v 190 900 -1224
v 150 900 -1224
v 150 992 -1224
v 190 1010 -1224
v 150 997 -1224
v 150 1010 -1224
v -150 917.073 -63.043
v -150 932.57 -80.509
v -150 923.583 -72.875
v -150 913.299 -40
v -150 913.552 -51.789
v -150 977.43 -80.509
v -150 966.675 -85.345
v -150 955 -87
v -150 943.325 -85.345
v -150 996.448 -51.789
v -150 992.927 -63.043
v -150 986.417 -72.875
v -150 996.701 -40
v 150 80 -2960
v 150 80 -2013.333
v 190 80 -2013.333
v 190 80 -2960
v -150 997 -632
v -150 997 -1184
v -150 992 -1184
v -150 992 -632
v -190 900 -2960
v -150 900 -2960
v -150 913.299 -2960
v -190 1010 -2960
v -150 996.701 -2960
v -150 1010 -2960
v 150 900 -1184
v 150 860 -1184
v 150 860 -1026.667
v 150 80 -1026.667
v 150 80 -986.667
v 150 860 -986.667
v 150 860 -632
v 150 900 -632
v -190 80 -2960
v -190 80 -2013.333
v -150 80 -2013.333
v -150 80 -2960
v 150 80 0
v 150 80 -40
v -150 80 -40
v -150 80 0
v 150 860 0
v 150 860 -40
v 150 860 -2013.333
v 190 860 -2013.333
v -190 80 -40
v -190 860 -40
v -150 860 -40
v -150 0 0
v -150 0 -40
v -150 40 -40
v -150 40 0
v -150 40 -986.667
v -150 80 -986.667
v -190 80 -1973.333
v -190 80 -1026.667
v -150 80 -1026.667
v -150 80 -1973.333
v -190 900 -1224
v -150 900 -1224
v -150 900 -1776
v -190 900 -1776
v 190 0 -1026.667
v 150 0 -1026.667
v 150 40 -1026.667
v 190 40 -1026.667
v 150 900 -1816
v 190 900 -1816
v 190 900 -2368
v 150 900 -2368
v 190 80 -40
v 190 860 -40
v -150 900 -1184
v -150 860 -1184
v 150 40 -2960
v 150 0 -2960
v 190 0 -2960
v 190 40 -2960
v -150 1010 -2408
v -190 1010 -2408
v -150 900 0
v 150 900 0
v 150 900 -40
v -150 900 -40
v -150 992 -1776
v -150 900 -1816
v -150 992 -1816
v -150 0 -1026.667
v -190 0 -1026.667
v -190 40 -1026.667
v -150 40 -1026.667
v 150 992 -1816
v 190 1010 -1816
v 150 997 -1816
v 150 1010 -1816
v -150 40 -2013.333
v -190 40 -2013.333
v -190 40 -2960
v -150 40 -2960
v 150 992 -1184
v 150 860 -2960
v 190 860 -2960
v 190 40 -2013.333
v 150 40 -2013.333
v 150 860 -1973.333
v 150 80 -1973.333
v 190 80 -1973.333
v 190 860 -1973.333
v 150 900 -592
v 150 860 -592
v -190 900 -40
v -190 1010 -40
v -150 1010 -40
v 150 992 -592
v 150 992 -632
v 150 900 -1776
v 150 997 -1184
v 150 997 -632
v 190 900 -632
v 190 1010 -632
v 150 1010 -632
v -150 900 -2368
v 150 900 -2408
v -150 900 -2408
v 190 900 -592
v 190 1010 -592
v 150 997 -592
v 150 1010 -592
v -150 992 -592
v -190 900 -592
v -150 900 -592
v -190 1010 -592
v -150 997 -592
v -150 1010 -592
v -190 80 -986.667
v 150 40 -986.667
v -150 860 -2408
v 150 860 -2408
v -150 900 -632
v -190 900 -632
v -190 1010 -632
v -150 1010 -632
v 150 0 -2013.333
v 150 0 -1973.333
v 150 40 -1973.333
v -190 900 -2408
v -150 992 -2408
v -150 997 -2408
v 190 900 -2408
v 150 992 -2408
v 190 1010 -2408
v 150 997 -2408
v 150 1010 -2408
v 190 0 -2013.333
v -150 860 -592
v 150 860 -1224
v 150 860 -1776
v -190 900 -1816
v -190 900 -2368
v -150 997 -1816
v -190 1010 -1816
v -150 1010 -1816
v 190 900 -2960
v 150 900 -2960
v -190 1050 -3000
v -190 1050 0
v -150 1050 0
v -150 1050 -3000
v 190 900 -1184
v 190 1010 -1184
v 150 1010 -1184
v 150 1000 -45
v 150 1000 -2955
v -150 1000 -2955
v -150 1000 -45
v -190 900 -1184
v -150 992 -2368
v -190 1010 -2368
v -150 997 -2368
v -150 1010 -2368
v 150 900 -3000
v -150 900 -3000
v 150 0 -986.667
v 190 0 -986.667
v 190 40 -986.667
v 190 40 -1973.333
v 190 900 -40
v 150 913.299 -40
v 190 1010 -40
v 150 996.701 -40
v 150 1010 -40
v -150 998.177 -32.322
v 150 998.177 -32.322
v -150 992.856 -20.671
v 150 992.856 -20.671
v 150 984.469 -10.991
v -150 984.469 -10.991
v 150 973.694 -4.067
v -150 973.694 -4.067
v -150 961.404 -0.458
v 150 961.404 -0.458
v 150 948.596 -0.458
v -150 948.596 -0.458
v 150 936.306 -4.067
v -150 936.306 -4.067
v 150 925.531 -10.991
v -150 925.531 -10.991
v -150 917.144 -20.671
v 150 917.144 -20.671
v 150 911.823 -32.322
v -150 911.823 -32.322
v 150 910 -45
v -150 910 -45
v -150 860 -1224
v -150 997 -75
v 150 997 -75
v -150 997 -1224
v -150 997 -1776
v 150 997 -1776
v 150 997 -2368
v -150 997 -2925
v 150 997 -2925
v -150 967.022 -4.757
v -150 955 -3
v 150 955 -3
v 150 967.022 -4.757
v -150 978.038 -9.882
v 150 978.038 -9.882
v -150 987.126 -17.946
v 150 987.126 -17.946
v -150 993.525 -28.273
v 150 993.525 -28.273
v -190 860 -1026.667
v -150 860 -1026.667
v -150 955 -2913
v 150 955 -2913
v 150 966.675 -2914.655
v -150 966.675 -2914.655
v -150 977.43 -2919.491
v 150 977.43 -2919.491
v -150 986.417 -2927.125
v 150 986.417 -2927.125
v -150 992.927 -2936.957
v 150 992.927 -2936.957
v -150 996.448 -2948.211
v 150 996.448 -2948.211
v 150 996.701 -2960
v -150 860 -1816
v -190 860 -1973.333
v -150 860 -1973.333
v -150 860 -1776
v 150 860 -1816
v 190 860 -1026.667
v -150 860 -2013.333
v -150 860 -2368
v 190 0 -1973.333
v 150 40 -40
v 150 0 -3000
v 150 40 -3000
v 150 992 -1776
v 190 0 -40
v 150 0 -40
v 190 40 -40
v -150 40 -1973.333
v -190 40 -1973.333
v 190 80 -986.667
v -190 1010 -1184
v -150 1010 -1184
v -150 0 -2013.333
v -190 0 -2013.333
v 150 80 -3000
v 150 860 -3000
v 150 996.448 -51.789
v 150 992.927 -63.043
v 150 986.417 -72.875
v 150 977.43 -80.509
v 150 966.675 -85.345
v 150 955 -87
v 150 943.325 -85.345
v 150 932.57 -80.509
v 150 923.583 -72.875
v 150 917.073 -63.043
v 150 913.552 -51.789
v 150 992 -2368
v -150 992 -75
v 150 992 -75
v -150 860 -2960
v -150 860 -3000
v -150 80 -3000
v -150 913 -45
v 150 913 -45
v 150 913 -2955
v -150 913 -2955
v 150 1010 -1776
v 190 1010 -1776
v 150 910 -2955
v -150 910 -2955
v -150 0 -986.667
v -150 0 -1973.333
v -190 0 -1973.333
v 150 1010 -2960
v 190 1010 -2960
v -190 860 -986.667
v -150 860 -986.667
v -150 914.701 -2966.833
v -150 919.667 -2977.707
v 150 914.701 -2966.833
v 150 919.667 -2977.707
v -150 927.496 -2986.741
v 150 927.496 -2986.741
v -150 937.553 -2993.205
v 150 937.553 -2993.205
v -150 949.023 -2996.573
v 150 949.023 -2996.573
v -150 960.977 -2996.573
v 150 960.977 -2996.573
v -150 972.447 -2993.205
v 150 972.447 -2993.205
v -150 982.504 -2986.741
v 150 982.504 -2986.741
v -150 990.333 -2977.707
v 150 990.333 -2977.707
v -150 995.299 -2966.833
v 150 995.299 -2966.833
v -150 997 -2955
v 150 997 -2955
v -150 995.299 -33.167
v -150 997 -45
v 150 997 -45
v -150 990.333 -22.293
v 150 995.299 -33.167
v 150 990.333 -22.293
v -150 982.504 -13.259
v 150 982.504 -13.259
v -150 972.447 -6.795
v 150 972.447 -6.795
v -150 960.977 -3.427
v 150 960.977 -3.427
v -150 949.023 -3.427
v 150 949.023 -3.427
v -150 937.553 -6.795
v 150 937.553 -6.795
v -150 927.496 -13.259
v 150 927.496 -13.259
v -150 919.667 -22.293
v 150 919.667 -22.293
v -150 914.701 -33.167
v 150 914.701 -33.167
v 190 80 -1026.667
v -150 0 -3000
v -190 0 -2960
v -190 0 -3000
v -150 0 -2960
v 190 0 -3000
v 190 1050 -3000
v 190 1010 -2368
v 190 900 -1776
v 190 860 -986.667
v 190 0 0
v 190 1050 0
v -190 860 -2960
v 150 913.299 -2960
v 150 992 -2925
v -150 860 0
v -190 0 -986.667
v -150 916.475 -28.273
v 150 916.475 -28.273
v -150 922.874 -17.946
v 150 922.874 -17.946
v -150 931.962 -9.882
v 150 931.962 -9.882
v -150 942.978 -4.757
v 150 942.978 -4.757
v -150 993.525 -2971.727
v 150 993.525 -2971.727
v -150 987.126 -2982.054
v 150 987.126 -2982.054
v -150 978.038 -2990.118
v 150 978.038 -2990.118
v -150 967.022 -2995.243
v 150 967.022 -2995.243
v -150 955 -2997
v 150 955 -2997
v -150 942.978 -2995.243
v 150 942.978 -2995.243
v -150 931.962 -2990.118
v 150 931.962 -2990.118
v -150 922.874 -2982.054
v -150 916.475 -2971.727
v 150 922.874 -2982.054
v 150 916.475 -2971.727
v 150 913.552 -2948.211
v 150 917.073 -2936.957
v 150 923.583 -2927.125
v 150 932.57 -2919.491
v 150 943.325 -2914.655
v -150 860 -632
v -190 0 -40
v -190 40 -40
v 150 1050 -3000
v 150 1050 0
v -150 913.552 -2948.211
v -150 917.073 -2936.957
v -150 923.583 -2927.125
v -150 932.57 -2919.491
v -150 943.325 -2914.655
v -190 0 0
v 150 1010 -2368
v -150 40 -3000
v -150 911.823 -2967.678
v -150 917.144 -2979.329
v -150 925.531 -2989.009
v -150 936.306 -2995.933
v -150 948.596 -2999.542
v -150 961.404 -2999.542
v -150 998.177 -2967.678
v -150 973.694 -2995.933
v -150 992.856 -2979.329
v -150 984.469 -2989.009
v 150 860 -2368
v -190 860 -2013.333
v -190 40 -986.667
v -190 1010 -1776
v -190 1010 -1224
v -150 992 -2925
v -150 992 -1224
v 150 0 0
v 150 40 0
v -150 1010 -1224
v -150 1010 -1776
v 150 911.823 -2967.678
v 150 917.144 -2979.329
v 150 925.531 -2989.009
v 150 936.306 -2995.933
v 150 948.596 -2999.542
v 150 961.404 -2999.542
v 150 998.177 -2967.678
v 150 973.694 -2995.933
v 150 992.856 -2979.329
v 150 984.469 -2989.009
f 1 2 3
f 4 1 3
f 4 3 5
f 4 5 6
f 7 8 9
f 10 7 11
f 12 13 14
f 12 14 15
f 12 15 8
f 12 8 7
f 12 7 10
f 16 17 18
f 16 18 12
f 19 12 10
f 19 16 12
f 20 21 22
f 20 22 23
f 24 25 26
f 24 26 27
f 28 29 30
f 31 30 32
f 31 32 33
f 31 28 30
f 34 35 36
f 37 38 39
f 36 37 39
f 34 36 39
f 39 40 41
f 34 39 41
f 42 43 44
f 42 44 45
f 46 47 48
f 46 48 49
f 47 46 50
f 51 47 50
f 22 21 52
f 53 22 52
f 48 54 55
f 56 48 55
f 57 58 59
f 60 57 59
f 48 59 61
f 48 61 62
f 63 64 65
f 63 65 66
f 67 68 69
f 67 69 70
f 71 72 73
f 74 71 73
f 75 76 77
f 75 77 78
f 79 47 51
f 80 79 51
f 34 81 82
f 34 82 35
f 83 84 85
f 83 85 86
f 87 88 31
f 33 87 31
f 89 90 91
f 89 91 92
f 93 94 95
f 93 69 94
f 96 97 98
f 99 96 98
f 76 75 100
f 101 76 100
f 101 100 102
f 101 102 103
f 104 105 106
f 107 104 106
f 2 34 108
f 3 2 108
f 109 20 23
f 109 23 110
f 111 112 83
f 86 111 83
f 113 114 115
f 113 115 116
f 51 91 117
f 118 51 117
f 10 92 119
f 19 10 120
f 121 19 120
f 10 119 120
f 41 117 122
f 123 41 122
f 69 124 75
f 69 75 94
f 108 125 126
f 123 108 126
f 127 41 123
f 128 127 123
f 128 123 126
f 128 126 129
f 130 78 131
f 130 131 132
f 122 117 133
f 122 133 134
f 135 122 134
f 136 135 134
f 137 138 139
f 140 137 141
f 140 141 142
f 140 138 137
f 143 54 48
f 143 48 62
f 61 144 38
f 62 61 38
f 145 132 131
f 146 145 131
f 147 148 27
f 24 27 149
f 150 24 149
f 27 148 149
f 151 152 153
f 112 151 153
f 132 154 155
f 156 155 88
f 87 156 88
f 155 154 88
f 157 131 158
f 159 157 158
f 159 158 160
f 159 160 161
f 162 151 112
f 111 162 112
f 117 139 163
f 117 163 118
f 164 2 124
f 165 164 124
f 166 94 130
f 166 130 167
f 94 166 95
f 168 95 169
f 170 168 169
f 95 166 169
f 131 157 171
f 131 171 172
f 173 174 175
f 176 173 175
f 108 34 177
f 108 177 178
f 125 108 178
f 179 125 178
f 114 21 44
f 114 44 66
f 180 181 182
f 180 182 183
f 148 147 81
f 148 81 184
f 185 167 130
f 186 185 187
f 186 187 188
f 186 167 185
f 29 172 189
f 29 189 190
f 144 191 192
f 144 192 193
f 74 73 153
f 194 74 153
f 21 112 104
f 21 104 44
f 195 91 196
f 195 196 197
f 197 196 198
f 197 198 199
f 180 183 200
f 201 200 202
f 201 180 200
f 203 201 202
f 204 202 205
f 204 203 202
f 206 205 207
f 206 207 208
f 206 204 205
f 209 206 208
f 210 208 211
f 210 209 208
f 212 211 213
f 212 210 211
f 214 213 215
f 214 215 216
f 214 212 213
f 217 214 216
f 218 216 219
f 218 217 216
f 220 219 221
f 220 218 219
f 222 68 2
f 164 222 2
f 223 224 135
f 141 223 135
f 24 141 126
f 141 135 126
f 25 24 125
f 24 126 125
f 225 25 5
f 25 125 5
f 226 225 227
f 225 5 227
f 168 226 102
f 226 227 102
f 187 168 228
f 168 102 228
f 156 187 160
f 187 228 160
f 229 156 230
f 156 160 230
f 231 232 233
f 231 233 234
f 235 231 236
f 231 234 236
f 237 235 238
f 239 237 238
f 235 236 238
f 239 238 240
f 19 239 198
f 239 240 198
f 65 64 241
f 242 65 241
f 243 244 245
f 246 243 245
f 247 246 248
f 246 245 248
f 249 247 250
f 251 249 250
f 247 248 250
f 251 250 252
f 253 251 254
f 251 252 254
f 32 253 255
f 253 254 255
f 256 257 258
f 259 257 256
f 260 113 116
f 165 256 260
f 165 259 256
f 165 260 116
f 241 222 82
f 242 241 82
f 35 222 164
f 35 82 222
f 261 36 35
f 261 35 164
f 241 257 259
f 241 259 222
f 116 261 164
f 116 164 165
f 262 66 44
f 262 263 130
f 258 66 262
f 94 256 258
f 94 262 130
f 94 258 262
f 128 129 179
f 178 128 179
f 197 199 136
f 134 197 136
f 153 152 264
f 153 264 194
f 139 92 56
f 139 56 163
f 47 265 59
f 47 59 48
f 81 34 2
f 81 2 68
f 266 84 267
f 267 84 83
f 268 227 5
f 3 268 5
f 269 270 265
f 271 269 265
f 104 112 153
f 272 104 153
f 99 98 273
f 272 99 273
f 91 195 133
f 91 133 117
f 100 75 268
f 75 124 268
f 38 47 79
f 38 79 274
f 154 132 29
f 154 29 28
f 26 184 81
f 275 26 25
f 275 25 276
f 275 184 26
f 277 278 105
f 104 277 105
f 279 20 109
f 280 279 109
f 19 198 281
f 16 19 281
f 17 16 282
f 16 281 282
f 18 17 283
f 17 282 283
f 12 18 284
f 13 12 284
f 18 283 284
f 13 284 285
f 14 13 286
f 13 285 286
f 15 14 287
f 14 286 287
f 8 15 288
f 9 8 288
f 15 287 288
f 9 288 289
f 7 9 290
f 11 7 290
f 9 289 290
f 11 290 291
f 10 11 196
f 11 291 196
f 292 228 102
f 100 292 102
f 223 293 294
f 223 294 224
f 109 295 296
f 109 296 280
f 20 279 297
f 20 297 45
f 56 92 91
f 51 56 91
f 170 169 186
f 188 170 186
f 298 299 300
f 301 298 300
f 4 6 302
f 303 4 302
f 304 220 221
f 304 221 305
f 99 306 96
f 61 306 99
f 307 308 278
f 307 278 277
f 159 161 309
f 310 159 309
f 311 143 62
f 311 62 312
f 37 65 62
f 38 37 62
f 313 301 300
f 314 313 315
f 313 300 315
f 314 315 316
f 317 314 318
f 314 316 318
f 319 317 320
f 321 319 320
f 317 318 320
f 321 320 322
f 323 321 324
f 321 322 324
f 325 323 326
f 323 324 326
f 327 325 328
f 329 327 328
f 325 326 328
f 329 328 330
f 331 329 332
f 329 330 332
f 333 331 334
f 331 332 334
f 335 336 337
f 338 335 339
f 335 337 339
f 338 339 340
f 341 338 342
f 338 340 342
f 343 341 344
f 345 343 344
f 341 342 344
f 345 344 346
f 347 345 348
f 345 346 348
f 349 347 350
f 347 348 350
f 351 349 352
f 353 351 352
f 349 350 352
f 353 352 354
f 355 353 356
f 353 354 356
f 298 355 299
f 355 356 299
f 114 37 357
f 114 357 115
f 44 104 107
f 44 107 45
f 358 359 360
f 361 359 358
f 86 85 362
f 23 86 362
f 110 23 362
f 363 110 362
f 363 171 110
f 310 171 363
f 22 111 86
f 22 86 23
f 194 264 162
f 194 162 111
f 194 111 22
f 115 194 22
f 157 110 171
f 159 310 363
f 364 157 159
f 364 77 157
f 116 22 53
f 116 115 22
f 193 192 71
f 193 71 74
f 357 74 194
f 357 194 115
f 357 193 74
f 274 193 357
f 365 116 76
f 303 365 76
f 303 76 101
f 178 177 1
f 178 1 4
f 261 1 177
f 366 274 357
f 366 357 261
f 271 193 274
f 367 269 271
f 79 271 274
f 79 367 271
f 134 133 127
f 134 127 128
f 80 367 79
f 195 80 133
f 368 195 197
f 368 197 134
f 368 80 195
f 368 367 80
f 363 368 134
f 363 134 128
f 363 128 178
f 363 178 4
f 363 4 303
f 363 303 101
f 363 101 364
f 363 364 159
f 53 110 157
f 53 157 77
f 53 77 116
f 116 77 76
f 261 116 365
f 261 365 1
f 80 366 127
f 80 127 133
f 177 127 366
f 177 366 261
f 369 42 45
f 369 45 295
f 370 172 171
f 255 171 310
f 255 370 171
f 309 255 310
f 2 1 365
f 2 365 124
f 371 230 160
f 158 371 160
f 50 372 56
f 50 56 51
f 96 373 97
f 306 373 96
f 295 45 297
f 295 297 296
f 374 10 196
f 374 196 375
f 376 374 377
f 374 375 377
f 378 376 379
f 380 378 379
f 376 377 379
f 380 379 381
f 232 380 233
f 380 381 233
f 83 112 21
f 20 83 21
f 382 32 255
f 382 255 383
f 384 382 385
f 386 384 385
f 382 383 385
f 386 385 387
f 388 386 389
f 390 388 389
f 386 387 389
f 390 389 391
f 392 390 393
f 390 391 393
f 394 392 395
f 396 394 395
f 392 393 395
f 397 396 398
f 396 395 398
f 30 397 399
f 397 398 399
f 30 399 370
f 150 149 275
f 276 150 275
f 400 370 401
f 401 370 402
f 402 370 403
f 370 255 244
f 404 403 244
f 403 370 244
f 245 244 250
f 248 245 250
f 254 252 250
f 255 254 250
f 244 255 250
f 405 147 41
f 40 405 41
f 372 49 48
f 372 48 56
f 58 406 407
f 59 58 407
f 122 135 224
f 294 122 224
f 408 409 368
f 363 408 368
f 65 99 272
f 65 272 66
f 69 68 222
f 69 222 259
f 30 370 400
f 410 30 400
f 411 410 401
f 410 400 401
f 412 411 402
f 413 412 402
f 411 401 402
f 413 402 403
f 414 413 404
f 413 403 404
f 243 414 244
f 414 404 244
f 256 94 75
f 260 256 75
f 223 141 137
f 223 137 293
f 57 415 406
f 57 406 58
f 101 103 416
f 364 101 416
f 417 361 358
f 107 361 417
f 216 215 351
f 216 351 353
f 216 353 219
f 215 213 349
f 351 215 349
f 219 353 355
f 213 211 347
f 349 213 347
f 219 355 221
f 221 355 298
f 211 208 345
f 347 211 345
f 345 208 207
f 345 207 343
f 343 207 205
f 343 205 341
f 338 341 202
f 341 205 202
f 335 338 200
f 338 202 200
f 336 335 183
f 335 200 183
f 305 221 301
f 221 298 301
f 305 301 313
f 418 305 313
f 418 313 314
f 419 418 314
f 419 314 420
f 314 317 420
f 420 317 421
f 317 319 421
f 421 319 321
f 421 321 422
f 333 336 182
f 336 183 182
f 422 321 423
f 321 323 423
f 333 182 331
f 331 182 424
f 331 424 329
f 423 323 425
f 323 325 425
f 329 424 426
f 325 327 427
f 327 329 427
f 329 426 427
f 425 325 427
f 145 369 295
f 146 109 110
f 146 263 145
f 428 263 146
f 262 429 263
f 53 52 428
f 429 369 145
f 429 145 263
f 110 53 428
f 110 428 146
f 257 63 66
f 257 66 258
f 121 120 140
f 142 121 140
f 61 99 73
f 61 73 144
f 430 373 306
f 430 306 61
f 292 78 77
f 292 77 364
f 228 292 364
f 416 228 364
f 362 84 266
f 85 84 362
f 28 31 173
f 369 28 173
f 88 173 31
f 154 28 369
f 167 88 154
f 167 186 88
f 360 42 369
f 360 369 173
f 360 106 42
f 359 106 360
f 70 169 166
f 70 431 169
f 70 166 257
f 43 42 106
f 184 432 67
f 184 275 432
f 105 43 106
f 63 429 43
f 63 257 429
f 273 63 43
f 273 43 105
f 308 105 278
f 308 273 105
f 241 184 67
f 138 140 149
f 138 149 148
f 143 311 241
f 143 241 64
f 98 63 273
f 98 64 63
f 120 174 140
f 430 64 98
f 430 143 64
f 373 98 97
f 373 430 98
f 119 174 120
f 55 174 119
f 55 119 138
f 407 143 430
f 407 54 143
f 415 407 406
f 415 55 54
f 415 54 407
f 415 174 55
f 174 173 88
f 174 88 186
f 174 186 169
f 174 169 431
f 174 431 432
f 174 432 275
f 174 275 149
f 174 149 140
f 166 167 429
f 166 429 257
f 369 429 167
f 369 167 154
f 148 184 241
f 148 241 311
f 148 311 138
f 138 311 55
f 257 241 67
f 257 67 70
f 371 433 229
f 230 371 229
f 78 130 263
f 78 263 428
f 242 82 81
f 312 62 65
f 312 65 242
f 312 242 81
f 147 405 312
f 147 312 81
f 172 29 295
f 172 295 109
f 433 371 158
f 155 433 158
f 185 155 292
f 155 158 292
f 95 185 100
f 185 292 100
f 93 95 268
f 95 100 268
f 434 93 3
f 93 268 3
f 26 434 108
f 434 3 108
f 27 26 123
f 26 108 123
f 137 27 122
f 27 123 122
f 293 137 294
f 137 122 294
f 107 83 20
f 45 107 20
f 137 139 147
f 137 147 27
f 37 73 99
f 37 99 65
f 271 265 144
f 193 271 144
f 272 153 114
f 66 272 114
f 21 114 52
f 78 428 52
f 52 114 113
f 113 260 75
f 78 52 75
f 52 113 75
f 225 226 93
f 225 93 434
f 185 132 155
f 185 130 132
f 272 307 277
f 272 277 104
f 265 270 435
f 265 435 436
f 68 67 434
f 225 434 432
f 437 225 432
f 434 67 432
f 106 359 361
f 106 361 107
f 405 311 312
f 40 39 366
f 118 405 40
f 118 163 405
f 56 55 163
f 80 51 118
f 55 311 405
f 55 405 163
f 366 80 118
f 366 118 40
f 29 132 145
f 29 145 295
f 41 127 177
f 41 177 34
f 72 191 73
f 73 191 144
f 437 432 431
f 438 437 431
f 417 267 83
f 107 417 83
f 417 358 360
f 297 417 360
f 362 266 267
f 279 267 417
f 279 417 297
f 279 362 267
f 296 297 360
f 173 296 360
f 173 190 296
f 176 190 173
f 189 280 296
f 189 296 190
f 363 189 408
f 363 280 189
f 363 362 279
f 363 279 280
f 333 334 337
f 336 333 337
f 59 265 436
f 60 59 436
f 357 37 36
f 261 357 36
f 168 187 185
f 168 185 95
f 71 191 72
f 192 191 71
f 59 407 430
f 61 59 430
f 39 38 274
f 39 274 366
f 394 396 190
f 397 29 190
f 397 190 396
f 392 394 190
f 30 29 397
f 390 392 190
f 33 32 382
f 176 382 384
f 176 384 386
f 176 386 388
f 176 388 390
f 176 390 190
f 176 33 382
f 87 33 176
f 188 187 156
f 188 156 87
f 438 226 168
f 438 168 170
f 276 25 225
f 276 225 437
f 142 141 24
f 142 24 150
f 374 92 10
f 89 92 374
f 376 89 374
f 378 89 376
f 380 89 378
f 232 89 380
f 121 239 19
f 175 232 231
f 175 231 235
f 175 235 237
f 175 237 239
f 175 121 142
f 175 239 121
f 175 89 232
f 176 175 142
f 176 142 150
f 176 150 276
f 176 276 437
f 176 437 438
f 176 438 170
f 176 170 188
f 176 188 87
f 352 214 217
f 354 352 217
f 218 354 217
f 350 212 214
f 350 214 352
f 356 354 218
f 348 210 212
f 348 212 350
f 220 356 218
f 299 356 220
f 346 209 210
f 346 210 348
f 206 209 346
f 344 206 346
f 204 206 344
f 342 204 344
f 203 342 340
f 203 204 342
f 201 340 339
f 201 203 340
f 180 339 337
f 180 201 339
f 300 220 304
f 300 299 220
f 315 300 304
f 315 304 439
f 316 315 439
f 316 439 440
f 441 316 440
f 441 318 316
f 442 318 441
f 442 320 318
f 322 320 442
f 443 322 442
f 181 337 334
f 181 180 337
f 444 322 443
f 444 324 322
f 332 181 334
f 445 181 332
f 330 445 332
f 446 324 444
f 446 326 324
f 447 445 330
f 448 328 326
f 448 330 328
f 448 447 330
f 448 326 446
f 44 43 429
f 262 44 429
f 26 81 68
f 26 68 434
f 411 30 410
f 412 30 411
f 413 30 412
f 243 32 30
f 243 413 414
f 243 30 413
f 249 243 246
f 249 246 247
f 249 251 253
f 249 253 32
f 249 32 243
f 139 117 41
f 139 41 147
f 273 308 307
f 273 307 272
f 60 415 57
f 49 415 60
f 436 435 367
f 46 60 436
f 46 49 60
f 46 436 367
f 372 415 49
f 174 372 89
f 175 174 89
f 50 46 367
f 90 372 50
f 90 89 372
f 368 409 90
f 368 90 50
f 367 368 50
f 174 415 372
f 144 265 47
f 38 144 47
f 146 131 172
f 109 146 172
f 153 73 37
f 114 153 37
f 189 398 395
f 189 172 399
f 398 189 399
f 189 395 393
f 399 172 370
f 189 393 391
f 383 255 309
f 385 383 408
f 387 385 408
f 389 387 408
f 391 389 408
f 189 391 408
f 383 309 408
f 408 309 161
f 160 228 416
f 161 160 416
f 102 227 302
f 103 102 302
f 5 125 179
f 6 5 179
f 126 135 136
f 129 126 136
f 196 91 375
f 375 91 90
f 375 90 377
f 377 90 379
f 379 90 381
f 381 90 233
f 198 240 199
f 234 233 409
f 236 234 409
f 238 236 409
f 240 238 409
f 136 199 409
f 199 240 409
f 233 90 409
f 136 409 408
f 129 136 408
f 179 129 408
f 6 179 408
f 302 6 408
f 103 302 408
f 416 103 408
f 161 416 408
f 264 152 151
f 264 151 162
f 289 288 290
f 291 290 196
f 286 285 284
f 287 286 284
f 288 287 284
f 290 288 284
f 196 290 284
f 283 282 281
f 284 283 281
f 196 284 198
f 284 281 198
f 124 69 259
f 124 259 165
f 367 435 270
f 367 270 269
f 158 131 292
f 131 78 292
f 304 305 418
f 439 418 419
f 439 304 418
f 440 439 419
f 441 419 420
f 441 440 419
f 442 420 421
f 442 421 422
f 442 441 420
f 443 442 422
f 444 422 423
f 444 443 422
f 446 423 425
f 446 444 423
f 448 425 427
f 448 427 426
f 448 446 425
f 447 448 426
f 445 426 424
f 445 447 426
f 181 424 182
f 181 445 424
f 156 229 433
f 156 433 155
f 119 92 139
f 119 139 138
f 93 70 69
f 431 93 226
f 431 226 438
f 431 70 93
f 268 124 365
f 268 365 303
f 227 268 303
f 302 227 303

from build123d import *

# Parameters (mm, degrees)
SKIZZE1_W                            = 40
SKIZZE1_H                            = 860
SKIZZE1_H_2                          = 150
AUFSATZ_LINEAR_AUSTRAGEN1_DEPTH      = 3000
SCHNITT_LINEAR_AUSTRAGEN1_DEPTH      = 3202.077943443
SCHNITT_LINEAR_AUSTRAGEN1_DEPTH_BACK = 3202.077943443
SKIZZE2_W                            = 552
SKIZZE2_H                            = 110
SKIZZE2_W_2                          = 946.666666667
SKIZZE2_H_2                          = 780
SKIZZE2_W_3                          = 946.666666666
SKIZZE2_H_3                          = 40
SKIZZE3_W                            = 300
SKIZZE3_H                            = 552
SCHNITT_LINEAR_AUSTRAGEN2_DEPTH      = 3138.849582118
AUFSATZ_LINEAR_AUSTRAGEN2_DEPTH      = 300
SKIZZE5_W                            = 517
SKIZZE5_H                            = 5
SKIZZE5_W_2                          = 552
SKIZZE5_W_3                          = 40
AUFSATZ_LINEAR_AUSTRAGEN3_DEPTH      = 300
SKIZZE6_W                            = 40
SKIZZE6_H                            = 40
AUFSATZ_LINEAR_AUSTRAGEN4_DEPTH      = 300


with BuildPart() as part:
    # Skizze1 → Aufsatz-Linear austragen1 (new body)
    with BuildSketch(Plane.XY):
        with Locations((170, 430)):
            Rectangle(SKIZZE1_W, SKIZZE1_H)
        Polygon((-150, 900), (-190, 900), (-190, 860), (-150, 860), (150, 860), (190, 860), (190, 900), (150, 900), align=None)
        with Locations((170, 975)):
            Rectangle(SKIZZE1_W, SKIZZE1_H_2)
        with Locations((-170, 975)):
            Rectangle(SKIZZE1_W, SKIZZE1_H_2)
        with Locations((-170, 430)):
            Rectangle(SKIZZE1_W, SKIZZE1_H)
    extrude(amount=-AUFSATZ_LINEAR_AUSTRAGEN1_DEPTH)

    # Skizze2 → Schnitt-Linear austragen1 (cut, two sides: drawn at the far end of the back side and taken through both)
    with BuildSketch(Plane(origin=(190, 0, 0), x_dir=(0, 0, -1), z_dir=(1, 0, 0)).offset(-SCHNITT_LINEAR_AUSTRAGEN1_DEPTH_BACK)):
        with Locations((316, 955)):
            Rectangle(SKIZZE2_W, SKIZZE2_H)
        with Locations((908, 955)):
            Rectangle(SKIZZE2_W, SKIZZE2_H)
        with Locations((513.333333334, 470)):
            Rectangle(SKIZZE2_W_2, SKIZZE2_H_2)
        with Locations((1500, 470)):
            Rectangle(SKIZZE2_W_3, SKIZZE2_H_2)
        with Locations((2486.666666667, 470)):
            Rectangle(SKIZZE2_W_2, SKIZZE2_H_2)
        with Locations((513.333333334, 20)):
            Rectangle(SKIZZE2_W_2, SKIZZE2_H_3)
        with Locations((1500, 20)):
            Rectangle(SKIZZE2_W_3, SKIZZE2_H_3)
        with Locations((2486.666666667, 20)):
            Rectangle(SKIZZE2_W_2, SKIZZE2_H_3)
        with Locations((1500, 955)):
            Rectangle(SKIZZE2_W, SKIZZE2_H)
        with Locations((2092, 955)):
            Rectangle(SKIZZE2_W, SKIZZE2_H)
        with Locations((2684, 955)):
            Rectangle(SKIZZE2_W, SKIZZE2_H)
    extrude(amount=SCHNITT_LINEAR_AUSTRAGEN1_DEPTH + SCHNITT_LINEAR_AUSTRAGEN1_DEPTH_BACK, mode=Mode.SUBTRACT)

    # Skizze3 → Schnitt-Linear austragen2 (cut, through all)
    with BuildSketch(Plane(origin=(0, 900, 0), x_dir=(1, 0, 0), z_dir=(0, 1, 0))):
        with Locations((0, 2684)):
            Rectangle(SKIZZE3_W, SKIZZE3_H)
        with Locations((0, 2092)):
            Rectangle(SKIZZE3_W, SKIZZE3_H)
        with Locations((0, 1500)):
            Rectangle(SKIZZE3_W, SKIZZE3_H)
        with Locations((0, 908)):
            Rectangle(SKIZZE3_W, SKIZZE3_H)
        with Locations((0, 316)):
            Rectangle(SKIZZE3_W, SKIZZE3_H)
    extrude(amount=-SCHNITT_LINEAR_AUSTRAGEN2_DEPTH, mode=Mode.SUBTRACT)

    # Skizze5 → Aufsatz-Linear austragen3 (add)
    with BuildSketch(Plane.ZY.offset(-150)):
        with Locations((-2666.5, 994.5)):
            Rectangle(SKIZZE5_W, SKIZZE5_H)
        with BuildLine():
            ThreePointArc((-2960, 913.298681076), (-2927.12528027, 923.583443855), (-2913, 955))
            ThreePointArc((-2913, 955), (-2927.12528027, 986.416556145), (-2960, 996.701318924))
            Line((-2960, 996.701318924), (-2960, 913.298681076))
        make_face()
        with BuildLine():
            Line((-2960, 913.298681076), (-2960, 996.701318924))
            ThreePointArc((-2960, 996.701318924), (-2997, 955), (-2960, 913.298681076))
        make_face()
        with Locations((-2092, 994.5)):
            Rectangle(SKIZZE5_W_2, SKIZZE5_H)
        with Locations((-2388, 994.5)):
            Rectangle(SKIZZE5_W_3, SKIZZE5_H)
        with Locations((-1500, 994.5)):
            Rectangle(SKIZZE5_W_2, SKIZZE5_H)
        with Locations((-1796, 994.5)):
            Rectangle(SKIZZE5_W_3, SKIZZE5_H)
        with Locations((-908, 994.5)):
            Rectangle(SKIZZE5_W_2, SKIZZE5_H)
        with Locations((-1204, 994.5)):
            Rectangle(SKIZZE5_W_3, SKIZZE5_H)
        with Locations((-612, 994.5)):
            Rectangle(SKIZZE5_W_3, SKIZZE5_H)
        with BuildLine():
            ThreePointArc((-40, 913.298681076), (-13.583443855, 927.12528027), (-3, 955))
            ThreePointArc((-3, 955), (-13.583443855, 982.87471973), (-40, 996.701318924))
            Line((-40, 996.701318924), (-40, 913.298681076))
        make_face()
        with BuildLine():
            Line((-40, 913.298681076), (-40, 996.701318924))
            ThreePointArc((-40, 996.701318924), (-87, 955), (-40, 913.298681076))
        make_face()
        with Locations((-333.5, 994.5)):
            Rectangle(SKIZZE5_W, SKIZZE5_H)
    extrude(amount=AUFSATZ_LINEAR_AUSTRAGEN3_DEPTH)

    # Skizze6 → Aufsatz-Linear austragen4 (add)
    with BuildSketch(Plane.ZY.offset(-150)):
        with Locations((-2980, 60)):
            Rectangle(SKIZZE6_W, SKIZZE6_H)
        with Locations((-1993.333333333, 60)):
            Rectangle(SKIZZE6_W, SKIZZE6_H)
        with Locations((-20, 60)):
            Rectangle(SKIZZE6_W, SKIZZE6_H)
        with Locations((-1006.666666667, 60)):
            Rectangle(SKIZZE6_W, SKIZZE6_H)
    extrude(amount=AUFSATZ_LINEAR_AUSTRAGEN4_DEPTH)


with BuildPart() as body_2:
    # Skizze4 → Aufsatz-Linear austragen2 (new body)
    with BuildSketch(Plane.ZY.offset(-150)):
        with BuildLine():
            Line((-2955, 1000), (-45, 1000))
            ThreePointArc((-45, 1000), (0, 955), (-45, 910))
            Line((-45, 910), (-2955, 910))
            ThreePointArc((-2955, 910), (-3000, 955), (-2955, 1000))
        make_face()
        with BuildLine():
            Line((-2955, 997), (-45, 997))
            ThreePointArc((-45, 997), (-3, 955), (-45, 913))
            Line((-45, 913), (-2955, 913))
            ThreePointArc((-2955, 913), (-2997, 955), (-2955, 997))
        make_face(mode=Mode.SUBTRACT)
    extrude(amount=AUFSATZ_LINEAR_AUSTRAGEN2_DEPTH)


solid = Compound([part.part, body_2.part])
